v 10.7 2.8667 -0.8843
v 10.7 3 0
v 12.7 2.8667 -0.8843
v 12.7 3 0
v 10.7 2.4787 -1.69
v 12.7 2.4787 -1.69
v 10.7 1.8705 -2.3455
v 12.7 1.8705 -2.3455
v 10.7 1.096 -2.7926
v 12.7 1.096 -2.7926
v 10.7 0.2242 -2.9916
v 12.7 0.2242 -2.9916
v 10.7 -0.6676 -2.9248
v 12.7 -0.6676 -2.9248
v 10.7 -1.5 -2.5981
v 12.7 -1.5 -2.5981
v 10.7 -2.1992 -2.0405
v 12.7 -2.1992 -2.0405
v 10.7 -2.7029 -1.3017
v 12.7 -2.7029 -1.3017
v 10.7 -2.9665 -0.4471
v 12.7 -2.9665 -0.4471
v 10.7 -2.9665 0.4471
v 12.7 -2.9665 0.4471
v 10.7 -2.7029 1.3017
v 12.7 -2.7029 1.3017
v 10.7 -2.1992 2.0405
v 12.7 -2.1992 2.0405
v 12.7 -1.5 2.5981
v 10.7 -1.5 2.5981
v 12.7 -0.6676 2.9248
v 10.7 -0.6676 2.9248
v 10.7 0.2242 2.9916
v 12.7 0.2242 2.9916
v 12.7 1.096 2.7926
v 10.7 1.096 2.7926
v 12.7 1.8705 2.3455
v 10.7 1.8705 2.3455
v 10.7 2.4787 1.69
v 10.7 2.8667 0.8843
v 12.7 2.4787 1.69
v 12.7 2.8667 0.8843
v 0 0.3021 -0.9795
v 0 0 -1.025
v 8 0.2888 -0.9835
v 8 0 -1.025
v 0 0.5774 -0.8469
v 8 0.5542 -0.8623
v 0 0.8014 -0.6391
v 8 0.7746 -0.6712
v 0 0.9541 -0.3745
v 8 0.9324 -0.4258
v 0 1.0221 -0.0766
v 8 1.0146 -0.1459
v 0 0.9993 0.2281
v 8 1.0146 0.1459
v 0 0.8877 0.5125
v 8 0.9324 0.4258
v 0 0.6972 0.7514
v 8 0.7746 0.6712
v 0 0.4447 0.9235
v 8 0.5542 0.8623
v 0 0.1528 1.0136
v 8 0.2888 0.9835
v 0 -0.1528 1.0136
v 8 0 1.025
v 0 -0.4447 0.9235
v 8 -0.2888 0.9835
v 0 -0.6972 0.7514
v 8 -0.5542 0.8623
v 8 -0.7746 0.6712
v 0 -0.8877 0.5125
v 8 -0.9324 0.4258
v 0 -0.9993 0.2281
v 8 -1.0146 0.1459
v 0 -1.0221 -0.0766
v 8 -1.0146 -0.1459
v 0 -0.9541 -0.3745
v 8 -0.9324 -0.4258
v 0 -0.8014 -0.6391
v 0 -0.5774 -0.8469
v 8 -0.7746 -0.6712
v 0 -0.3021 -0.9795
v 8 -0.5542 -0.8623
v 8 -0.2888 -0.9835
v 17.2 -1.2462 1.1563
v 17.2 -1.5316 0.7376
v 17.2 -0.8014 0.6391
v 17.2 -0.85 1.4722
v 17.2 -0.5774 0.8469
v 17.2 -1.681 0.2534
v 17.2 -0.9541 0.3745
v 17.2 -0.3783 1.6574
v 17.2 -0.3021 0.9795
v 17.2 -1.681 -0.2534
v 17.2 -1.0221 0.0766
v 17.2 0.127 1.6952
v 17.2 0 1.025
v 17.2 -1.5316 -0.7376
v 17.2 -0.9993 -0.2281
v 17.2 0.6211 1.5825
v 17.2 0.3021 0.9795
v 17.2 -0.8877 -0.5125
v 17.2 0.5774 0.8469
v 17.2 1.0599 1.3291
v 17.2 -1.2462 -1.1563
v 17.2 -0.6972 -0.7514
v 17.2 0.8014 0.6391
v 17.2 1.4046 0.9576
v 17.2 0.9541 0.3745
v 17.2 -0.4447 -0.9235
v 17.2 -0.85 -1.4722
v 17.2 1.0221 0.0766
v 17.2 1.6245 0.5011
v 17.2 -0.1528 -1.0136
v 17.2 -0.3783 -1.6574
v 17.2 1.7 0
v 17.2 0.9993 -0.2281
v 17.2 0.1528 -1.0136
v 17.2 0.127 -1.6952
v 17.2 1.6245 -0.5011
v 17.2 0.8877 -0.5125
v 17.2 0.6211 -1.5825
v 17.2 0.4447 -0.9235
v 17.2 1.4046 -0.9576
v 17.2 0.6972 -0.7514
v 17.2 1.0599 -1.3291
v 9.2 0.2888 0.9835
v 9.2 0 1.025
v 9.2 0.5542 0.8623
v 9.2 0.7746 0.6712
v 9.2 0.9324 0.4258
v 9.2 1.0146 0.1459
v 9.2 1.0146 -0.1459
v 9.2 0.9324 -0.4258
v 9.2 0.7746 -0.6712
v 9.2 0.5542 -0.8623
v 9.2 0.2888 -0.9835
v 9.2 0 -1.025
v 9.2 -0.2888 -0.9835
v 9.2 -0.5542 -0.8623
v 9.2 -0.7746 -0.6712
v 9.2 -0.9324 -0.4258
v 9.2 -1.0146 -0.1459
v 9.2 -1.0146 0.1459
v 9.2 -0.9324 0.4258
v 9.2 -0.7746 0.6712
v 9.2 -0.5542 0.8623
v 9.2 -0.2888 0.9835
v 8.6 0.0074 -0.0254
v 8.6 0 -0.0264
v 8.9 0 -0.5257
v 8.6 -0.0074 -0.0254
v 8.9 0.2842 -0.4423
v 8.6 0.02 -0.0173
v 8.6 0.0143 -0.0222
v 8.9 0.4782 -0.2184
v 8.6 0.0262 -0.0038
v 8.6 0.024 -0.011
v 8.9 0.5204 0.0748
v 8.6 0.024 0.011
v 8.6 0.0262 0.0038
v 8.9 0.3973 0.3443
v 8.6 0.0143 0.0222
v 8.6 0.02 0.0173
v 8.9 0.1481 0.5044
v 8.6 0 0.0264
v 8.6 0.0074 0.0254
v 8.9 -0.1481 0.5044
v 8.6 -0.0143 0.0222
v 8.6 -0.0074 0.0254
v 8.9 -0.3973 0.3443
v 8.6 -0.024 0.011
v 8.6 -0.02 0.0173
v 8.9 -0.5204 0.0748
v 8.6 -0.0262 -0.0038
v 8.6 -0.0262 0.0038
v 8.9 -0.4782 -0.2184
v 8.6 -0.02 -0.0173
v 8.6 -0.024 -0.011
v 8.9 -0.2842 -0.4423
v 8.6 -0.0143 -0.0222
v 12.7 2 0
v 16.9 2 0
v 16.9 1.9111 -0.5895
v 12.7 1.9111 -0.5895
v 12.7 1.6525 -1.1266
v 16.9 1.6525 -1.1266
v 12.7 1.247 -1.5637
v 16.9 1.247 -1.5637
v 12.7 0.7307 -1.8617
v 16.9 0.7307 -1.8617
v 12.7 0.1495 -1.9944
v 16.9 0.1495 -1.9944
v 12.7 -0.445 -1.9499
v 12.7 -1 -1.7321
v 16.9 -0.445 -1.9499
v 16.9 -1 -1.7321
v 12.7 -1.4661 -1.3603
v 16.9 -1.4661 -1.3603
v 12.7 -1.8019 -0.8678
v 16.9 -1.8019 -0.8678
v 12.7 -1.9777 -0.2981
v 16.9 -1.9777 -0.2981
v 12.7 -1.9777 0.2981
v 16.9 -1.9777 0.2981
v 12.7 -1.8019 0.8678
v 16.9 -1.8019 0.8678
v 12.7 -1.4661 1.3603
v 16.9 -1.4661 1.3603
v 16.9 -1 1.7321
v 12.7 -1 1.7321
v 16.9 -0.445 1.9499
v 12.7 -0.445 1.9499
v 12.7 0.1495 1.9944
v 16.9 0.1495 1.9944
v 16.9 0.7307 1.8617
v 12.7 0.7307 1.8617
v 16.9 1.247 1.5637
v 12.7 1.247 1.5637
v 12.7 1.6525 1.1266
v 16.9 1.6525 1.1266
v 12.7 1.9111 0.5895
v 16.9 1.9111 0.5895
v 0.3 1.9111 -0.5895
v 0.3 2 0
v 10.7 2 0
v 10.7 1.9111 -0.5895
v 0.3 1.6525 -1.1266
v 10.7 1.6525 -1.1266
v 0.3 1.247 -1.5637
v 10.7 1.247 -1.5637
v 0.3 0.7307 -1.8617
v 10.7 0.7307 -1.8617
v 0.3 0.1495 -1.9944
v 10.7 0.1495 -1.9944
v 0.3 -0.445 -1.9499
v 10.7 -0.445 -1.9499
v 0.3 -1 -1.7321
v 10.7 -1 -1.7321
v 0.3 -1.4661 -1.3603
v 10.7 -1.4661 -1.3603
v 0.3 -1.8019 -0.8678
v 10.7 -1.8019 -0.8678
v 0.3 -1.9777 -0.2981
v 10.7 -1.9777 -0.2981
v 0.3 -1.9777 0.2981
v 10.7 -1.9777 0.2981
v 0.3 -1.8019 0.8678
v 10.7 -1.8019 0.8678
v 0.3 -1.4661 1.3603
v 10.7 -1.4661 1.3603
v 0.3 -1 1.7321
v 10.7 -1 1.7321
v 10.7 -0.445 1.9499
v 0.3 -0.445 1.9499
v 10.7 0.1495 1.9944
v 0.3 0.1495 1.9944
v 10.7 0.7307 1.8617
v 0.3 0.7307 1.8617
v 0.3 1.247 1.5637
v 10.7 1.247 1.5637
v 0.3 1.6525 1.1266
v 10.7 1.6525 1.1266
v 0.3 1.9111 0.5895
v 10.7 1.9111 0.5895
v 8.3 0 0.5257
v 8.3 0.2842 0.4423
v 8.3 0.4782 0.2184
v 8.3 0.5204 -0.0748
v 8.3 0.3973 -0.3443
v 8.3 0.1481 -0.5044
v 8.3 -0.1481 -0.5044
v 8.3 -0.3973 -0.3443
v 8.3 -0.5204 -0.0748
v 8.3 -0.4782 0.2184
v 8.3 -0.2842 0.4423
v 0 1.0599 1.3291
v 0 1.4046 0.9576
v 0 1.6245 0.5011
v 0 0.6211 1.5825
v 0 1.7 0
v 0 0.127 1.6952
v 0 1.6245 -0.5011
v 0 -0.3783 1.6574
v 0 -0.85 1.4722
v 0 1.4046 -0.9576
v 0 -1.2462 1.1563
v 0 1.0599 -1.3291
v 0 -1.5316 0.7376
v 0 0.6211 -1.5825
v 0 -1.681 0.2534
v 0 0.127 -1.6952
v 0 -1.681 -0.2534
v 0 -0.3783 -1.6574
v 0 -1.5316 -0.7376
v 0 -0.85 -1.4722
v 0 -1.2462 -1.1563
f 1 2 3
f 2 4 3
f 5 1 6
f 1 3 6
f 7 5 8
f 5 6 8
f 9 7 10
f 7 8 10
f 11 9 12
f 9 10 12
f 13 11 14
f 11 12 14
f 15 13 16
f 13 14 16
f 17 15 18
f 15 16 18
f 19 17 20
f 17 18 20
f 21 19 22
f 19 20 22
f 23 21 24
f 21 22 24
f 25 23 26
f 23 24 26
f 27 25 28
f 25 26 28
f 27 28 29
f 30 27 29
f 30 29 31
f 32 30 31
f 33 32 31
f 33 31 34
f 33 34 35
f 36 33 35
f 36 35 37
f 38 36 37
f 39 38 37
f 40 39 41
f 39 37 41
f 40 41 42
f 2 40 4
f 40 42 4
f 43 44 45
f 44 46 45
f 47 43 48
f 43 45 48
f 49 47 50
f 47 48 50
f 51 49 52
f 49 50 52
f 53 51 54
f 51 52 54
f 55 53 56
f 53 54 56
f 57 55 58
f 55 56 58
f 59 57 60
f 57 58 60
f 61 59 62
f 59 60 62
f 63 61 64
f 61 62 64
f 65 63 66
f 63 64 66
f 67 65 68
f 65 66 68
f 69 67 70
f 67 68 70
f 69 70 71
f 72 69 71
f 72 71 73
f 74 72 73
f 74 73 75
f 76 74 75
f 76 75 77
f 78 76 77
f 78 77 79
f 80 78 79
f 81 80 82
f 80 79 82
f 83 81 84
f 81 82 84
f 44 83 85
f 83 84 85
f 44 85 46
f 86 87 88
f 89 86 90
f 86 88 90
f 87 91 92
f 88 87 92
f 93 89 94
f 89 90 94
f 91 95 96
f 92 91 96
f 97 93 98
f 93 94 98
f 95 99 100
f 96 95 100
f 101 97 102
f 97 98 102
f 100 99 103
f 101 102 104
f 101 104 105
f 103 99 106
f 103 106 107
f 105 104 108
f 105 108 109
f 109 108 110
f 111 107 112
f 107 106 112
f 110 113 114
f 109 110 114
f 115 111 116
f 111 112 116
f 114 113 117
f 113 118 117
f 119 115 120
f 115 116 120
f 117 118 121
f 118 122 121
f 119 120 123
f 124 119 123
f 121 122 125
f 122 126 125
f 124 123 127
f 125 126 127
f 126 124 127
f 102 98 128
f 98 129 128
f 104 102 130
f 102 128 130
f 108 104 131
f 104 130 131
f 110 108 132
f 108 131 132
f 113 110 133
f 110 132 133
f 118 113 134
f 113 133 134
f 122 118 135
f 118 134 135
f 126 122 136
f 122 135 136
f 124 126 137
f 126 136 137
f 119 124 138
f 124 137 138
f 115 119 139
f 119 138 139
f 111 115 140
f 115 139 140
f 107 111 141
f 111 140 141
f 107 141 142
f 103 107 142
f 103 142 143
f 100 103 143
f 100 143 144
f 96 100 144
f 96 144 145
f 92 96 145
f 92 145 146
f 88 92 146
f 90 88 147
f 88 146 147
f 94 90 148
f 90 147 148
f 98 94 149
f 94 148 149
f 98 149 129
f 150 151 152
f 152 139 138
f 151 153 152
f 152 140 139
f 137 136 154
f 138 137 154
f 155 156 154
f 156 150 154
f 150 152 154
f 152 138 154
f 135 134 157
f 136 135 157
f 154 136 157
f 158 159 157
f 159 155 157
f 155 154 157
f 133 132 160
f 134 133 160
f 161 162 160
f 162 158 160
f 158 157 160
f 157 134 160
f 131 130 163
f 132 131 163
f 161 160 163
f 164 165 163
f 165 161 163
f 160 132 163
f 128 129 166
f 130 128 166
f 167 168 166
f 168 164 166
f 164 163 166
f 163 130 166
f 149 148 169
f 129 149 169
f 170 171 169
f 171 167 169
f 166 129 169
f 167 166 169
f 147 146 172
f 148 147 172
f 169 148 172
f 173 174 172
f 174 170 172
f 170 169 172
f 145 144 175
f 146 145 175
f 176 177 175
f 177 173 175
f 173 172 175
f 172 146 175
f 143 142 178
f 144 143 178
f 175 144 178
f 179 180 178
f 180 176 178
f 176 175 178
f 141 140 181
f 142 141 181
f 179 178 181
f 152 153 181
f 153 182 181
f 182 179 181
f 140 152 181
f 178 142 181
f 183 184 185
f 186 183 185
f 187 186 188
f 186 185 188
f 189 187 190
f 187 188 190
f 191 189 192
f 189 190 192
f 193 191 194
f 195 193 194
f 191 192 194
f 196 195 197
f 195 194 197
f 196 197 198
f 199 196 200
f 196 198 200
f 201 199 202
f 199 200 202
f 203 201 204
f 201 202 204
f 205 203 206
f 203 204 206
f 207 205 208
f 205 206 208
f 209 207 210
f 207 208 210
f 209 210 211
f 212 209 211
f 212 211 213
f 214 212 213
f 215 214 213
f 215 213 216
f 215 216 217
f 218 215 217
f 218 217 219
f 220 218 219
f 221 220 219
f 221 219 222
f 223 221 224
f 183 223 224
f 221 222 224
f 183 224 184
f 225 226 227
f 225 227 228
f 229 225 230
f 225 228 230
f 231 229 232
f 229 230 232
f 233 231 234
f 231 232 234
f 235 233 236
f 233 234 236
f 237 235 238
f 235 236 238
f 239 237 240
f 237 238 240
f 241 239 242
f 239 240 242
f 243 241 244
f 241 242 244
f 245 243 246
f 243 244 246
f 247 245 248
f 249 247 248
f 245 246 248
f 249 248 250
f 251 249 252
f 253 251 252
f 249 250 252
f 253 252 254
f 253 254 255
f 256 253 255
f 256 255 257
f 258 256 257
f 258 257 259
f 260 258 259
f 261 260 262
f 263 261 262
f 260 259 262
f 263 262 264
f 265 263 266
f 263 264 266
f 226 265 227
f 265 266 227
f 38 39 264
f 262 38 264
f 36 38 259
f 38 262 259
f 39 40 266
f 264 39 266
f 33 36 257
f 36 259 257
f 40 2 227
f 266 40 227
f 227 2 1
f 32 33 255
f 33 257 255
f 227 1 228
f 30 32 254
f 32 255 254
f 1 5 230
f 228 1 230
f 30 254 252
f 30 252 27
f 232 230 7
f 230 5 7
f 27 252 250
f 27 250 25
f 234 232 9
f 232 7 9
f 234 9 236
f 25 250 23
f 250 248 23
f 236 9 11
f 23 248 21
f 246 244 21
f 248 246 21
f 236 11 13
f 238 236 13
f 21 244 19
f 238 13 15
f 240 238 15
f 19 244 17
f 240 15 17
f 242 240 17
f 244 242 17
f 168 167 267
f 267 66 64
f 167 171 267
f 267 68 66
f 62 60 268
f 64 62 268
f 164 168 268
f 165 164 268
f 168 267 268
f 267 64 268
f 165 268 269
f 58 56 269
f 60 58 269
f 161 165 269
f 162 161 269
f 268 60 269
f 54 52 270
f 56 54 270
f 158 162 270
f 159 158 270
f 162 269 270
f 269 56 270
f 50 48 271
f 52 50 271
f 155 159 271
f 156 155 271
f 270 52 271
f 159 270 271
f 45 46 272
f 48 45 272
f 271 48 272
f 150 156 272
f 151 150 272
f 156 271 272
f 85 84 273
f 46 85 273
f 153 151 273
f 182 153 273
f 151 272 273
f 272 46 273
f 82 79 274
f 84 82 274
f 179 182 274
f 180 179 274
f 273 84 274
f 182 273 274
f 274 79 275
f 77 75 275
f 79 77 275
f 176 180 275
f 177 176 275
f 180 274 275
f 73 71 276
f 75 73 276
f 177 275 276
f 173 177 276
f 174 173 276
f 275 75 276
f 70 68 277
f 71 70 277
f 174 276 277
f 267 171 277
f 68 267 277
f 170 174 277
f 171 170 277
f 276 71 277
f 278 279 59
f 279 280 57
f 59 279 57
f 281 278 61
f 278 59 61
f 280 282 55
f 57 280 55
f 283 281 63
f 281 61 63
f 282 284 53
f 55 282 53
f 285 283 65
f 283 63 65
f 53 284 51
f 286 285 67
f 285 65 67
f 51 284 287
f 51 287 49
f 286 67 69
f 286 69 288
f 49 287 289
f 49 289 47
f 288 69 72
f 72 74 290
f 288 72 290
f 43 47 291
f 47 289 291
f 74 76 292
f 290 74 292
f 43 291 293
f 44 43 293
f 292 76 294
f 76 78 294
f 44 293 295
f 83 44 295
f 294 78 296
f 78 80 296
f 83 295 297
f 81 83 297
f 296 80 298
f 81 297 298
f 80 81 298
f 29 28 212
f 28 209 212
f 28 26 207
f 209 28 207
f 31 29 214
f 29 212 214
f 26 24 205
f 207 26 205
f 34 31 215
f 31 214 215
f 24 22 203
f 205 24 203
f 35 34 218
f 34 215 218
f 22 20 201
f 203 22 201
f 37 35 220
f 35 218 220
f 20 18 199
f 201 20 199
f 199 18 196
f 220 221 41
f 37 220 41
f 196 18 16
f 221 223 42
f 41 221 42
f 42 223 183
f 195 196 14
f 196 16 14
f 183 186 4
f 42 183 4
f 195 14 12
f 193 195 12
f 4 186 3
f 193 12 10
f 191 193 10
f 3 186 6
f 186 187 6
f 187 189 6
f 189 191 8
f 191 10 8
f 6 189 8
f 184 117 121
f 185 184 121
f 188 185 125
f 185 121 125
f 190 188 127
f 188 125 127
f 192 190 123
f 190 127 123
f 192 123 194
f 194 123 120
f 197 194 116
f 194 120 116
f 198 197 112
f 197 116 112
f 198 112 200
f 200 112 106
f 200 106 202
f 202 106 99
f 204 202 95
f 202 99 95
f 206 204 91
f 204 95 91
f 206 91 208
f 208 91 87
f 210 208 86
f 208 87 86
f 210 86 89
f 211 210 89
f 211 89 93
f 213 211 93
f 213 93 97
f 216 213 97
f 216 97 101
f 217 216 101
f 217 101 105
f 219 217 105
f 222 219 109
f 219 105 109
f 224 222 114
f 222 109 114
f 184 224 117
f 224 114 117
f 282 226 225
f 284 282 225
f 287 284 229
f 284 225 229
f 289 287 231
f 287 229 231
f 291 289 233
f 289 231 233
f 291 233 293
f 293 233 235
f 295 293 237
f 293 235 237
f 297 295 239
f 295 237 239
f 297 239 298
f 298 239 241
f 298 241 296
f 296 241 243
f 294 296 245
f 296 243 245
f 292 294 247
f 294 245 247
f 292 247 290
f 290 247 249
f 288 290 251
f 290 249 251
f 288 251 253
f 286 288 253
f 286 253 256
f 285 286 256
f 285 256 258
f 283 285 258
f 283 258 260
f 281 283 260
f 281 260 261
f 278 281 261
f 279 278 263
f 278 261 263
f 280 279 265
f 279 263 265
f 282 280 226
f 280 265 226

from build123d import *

# Parameters (mm, degrees)
TROU_TARAUD_M2_51_D     = 2.05
TROU_TARAUD_M2_51_DEPTH = 8
TROU_TARAUD_M2_51_TIP   = 0.615882135
TROU_TARAUD_M2_52_D     = 2.05
TROU_TARAUD_M2_52_DEPTH = 8
TROU_TARAUD_M2_52_TIP   = 0.615882135
CHANFREIN1_SIZE         = 0.3


with BuildPart() as part:
    # Esquisse1 → Révolution1 (revolve)
    with BuildSketch(Plane.XY):
        Polygon((0, 0), (0, 2), (10.7, 2), (10.7, 3), (12.7, 3), (12.7, 2), (17.2, 2), (17.2, 0), align=None)
    revolve(axis=Axis((17.2, 0, 0), (-1, 0, 0)))

    # Trou taraudé M2.51
    with Locations(Plane.ZY):
        with Locations((0, 0)):
            Hole(TROU_TARAUD_M2_51_D / 2, depth=TROU_TARAUD_M2_51_DEPTH)
            with Locations((0, 0, -(TROU_TARAUD_M2_51_DEPTH + TROU_TARAUD_M2_51_TIP / 2))):  # 118° drill point
                Cone(0, TROU_TARAUD_M2_51_D / 2, TROU_TARAUD_M2_51_TIP, mode=Mode.SUBTRACT)

    # Trou taraudé M2.52
    with Locations(Plane(origin=(17.2, 0, 0), x_dir=(0, 0, -1), z_dir=(1, 0, 0))):
        with Locations((0, 0)):
            Hole(TROU_TARAUD_M2_52_D / 2, depth=TROU_TARAUD_M2_52_DEPTH)
            with Locations((0, 0, -(TROU_TARAUD_M2_52_DEPTH + TROU_TARAUD_M2_52_TIP / 2))):  # 118° drill point
                Cone(0, TROU_TARAUD_M2_52_D / 2, TROU_TARAUD_M2_52_TIP, mode=Mode.SUBTRACT)

    # Chanfrein1
    chanfrein1_edges = [part.edges().sort_by_distance(p)[0] for p in [
        (17.2, -2, 0),
        (0, -2, 0),
    ]]
    chamfer(chanfrein1_edges, length=CHANFREIN1_SIZE)


solid = part.part
